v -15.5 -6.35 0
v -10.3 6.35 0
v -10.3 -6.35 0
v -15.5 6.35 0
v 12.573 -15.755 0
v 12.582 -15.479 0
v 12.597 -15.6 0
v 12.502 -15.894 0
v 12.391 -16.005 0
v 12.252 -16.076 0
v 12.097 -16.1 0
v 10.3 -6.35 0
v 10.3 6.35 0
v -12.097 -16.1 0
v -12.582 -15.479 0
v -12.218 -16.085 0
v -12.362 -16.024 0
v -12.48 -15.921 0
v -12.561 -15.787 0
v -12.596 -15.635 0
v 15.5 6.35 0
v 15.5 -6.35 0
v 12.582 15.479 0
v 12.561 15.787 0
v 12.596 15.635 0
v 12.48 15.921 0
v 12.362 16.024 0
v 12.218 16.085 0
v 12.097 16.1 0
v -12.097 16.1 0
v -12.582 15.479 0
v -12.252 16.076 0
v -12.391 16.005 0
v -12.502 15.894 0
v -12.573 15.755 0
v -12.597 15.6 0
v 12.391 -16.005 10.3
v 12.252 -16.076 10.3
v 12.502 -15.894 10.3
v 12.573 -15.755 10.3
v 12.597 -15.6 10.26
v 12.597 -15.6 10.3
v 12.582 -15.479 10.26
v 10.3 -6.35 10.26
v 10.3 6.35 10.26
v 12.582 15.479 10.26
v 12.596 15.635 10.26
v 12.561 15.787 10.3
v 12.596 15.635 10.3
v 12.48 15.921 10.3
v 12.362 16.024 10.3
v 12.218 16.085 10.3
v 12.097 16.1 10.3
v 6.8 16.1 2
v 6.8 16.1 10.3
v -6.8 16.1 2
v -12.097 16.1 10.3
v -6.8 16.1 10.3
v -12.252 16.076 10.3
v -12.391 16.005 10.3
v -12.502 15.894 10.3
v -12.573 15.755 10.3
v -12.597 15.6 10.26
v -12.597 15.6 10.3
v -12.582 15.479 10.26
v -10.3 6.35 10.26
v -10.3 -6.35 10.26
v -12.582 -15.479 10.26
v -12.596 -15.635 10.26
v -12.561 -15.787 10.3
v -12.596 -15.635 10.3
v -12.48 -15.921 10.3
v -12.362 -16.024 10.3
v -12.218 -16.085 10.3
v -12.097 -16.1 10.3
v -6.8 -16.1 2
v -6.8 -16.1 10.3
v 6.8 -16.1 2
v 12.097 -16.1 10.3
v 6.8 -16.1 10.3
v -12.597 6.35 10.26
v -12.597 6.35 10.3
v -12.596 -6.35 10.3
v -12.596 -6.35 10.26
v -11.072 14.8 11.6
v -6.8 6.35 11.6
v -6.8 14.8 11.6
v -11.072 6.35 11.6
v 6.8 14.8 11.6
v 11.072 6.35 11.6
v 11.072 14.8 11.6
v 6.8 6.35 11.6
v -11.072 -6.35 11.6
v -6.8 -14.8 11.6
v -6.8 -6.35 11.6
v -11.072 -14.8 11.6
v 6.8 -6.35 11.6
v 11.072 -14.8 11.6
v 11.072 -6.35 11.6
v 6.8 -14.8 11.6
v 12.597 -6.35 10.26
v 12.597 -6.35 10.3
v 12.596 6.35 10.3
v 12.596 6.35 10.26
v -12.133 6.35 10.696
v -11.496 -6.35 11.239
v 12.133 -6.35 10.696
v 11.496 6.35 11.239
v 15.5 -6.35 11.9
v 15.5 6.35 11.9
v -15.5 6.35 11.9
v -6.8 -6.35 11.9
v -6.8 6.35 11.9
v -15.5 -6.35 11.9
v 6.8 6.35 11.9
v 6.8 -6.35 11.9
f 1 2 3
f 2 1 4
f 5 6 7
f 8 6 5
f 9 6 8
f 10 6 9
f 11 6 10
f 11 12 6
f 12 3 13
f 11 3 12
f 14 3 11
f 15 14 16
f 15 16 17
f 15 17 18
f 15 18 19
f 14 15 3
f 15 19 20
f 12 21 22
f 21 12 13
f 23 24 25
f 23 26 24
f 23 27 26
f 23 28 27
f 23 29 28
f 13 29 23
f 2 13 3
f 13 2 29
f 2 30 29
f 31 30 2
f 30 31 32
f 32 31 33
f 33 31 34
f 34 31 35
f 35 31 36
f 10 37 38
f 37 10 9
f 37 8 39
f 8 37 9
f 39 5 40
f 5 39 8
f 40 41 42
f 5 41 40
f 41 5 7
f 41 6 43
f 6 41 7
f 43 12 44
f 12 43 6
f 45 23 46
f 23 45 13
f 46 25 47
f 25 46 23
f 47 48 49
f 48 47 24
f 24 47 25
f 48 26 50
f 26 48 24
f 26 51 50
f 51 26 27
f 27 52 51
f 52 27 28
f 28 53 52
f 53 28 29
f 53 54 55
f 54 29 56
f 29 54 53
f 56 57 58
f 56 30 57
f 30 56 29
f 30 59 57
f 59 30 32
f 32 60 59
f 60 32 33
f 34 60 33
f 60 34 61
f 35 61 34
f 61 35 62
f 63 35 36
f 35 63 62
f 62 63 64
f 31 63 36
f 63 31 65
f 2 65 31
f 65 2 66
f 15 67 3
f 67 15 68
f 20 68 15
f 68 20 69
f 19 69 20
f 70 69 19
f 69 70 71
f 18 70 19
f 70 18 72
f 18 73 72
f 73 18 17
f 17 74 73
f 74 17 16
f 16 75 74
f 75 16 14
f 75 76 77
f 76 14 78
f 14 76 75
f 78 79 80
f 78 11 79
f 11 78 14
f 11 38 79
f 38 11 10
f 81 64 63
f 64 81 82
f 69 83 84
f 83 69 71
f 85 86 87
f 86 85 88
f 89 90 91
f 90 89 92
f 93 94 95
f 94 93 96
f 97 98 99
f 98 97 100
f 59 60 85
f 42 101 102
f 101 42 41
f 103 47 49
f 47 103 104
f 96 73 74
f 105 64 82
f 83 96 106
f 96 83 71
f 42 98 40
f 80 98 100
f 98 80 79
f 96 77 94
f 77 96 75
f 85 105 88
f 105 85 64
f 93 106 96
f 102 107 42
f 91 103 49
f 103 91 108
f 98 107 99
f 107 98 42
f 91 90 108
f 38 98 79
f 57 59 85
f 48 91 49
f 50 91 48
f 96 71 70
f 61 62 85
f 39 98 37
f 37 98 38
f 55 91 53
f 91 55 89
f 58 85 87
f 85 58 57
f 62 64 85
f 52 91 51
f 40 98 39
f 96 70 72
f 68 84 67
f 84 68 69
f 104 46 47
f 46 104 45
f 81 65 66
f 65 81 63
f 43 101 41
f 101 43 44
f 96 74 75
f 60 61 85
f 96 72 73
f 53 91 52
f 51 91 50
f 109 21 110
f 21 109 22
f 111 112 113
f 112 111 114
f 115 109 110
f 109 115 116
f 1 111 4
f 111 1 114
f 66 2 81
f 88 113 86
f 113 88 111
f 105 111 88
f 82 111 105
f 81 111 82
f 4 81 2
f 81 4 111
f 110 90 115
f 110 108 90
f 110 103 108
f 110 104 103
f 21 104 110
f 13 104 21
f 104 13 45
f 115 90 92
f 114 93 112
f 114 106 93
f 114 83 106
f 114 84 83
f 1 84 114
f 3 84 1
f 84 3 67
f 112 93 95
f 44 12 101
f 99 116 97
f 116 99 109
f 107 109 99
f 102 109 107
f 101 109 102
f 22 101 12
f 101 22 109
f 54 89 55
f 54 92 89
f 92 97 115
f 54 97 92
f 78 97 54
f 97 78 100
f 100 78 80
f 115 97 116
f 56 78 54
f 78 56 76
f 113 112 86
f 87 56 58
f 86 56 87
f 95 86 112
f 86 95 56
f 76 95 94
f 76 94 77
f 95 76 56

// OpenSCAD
// Universal Rear-Entry Interlocking Hollow Double-Dovetail ("Bowtie") Conduit Key
// Inserts straight into the flat BACK face of two mating letters (+Y -> -Y) where there is zero front-bezel overhang!
//   - Prints flat on its smooth 2.00 mm rear cap face (Z = 0 on build plate) with ZERO supports; continuous axial
//     perimeter loops carry >25 kg tensile load.
//   - Leading top edge (Z = 10.30 -> 11.60 mm) has a matching 1.30 mm x 45 deg chamfer that seats squarely against
//     the base socket's internal 45 deg positive depth-stop bevel so the back of the key sits dead-flush at Y = +12.40 mm!
//   - Center 13.60 mm channel fits a 10 mm or 12 mm WS2812B LED strip (or 3-pin JST-SM plug) right inside it.

dovetail_clearance = 0.20;        // Per-side XY clearance against female base mortise (mm)
end_clearance      = 0.25;        // Tip clearance so mating letter housings pull 100% tight face-to-face (mm)
bridge_gap         = 12.70;       // Letter-to-letter seam gap (mm): key spans the gap + 9.75 mm into each letter (length = gap + 19.5 mm)
straddle_open      = true;        // true = open inward U-channel (drop LED strip in, press key over it); false = closed tunnel

mortise_waist_w    = 21.00;
mortise_head_w     = 26.00;
mortise_depth      = 10.00;
key_body_h         = 10.30;       // Full-width dovetail height (seats into 10.50 mm straight rear mortise)
lead_chamfer       = 1.30;        // 45 deg leading-edge chamfer matching base's internal depth-stop seat (total Z = 11.60 mm)
bore_w             = 13.60;       // Clear internal width for 10 mm / 12 mm LED strip or JST-SM plug (mm)
rear_cap_t         = 2.00;        // Solid flush outer back cap (seals the rear seam opaque black at Y = +10.40 .. +12.40 mm!)
inner_web_t        = 1.60;        // Used only when straddle_open = false (leaves 6.70 mm x 13.60 mm enclosed box tunnel)
collar_w           = 31.00;       // Outer width of center bridge collar when bridge_gap > 0
collar_thick_y     = 11.90;       // Spans Y = +0.50 .. +12.40 mm when bridge_gap > 0

module bowtie_2d(gap, L, w0, w1, inset = 0) {
    half_g = gap / 2;
    offset(delta = -inset)
        offset(r = 0.5, $fn = 20) offset(delta = -0.5)
            polygon([
                [-w0, -half_g],
                [-w1, -(half_g + L)],
                [ w1, -(half_g + L)],
                [ w0, -half_g],
                [ w0,  half_g],
                [ w1,  half_g + L],
                [-w1,  half_g + L],
                [-w0,  half_g]
            ]);
}

module bowtie_key(gap = bridge_gap, straddle = straddle_open, clr = dovetail_clearance) {
    L = mortise_depth - end_clearance; // 9.75 mm insertion per side
    slope = ((mortise_head_w - mortise_waist_w) / 2) / mortise_depth; // 0.25 (14.04 deg)
    w0 = mortise_waist_w / 2 - clr;    // 10.30 mm
    w1 = w0 + slope * L;               // 12.74 mm
    half_g = gap / 2;
    total_len = 2 * (half_g + L);
    total_z = key_body_h + lead_chamfer; // 11.60 mm

    difference() {
        union() {
            // Straight rear-entry dovetail body (Z = 0 .. 10.30 mm) + 45 deg leading seat chamfer (Z = 10.30 .. 11.60 mm)
            linear_extrude(height = key_body_h)
                bowtie_2d(gap, L, w0, w1, 0);
            hull() {
                translate([0, 0, key_body_h - 0.04])
                    linear_extrude(height = 0.04) bowtie_2d(gap, L, w0, w1, 0);
                translate([0, 0, total_z - 0.04])
                    linear_extrude(height = 0.04) bowtie_2d(gap, L, w0, w1, lead_chamfer);
            }

            // Enclosed black spacer collar across non-zero bridge gaps (FL/FR side bridges)
            if (gap > 0.01)
                translate([-collar_w / 2, -half_g, 0])
                    cube([collar_w, gap, collar_thick_y]);
        }

        // Center 13.60 mm LED-strip channel: open U (straddle) across the full key length, gap included
        if (straddle) {
            // Open U-channel facing INWARD (-Y inside the lamp), solid 2.00 mm rear cap flush on the outside back!
            translate([-bore_w / 2, -total_len / 2 - 1, rear_cap_t])
                cube([bore_w, total_len + 2, total_z + 2]);
        } else {
            // Closed rectangular box tunnel (13.60 x 6.70 mm) enclosed front & back
            translate([-bore_w / 2, -total_len / 2 - 1, rear_cap_t])
                cube([bore_w, total_len + 2, key_body_h - rear_cap_t - inner_web_t]);
        }
    }
}

bowtie_key();
